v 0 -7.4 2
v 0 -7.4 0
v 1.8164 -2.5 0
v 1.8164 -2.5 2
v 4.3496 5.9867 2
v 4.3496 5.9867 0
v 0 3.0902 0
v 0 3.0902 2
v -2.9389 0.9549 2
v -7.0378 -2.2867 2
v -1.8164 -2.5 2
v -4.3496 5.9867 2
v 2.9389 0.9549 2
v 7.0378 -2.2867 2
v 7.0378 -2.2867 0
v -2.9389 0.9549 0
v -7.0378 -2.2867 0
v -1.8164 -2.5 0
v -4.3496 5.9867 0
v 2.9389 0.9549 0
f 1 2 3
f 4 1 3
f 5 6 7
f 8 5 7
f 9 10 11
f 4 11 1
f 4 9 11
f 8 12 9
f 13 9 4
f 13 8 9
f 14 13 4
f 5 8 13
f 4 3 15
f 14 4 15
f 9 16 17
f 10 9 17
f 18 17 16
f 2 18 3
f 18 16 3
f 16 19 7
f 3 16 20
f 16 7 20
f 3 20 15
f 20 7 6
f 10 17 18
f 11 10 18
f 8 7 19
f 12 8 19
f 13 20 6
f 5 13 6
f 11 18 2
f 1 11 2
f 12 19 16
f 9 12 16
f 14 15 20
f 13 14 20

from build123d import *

# Parameters (mm, degrees)
F1_DEPTH = 2


with BuildPart() as f1:
    # F0 (on Top) → F1 (new body)
    with BuildSketch(Plane.XY):
        Polygon((-2.938926, 0.954915), (0, 3.09017), (-4.349611, 5.986726), align=None)
        Polygon((4.349611, 5.986726), (0, 3.09017), (2.938926, 0.954915), align=None)
        Polygon((2.938926, 0.954915), (0, 3.09017), (-2.938926, 0.954915), (-1.816356, -2.5), (0, -2.5), (1.816356, -2.5), align=None)
        Polygon((-1.816356, -2.5), (-2.938926, 0.954915), (-7.037818, -2.286726), align=None)
        Polygon((0, -2.5), (-1.816356, -2.5), (0, -7.4), align=None)
        Polygon((7.037818, -2.286726), (2.938926, 0.954915), (1.816356, -2.5), align=None)
        Polygon((0, -7.4), (1.816356, -2.5), (0, -2.5), align=None)
    extrude(amount=F1_DEPTH)


solid = f1.part
